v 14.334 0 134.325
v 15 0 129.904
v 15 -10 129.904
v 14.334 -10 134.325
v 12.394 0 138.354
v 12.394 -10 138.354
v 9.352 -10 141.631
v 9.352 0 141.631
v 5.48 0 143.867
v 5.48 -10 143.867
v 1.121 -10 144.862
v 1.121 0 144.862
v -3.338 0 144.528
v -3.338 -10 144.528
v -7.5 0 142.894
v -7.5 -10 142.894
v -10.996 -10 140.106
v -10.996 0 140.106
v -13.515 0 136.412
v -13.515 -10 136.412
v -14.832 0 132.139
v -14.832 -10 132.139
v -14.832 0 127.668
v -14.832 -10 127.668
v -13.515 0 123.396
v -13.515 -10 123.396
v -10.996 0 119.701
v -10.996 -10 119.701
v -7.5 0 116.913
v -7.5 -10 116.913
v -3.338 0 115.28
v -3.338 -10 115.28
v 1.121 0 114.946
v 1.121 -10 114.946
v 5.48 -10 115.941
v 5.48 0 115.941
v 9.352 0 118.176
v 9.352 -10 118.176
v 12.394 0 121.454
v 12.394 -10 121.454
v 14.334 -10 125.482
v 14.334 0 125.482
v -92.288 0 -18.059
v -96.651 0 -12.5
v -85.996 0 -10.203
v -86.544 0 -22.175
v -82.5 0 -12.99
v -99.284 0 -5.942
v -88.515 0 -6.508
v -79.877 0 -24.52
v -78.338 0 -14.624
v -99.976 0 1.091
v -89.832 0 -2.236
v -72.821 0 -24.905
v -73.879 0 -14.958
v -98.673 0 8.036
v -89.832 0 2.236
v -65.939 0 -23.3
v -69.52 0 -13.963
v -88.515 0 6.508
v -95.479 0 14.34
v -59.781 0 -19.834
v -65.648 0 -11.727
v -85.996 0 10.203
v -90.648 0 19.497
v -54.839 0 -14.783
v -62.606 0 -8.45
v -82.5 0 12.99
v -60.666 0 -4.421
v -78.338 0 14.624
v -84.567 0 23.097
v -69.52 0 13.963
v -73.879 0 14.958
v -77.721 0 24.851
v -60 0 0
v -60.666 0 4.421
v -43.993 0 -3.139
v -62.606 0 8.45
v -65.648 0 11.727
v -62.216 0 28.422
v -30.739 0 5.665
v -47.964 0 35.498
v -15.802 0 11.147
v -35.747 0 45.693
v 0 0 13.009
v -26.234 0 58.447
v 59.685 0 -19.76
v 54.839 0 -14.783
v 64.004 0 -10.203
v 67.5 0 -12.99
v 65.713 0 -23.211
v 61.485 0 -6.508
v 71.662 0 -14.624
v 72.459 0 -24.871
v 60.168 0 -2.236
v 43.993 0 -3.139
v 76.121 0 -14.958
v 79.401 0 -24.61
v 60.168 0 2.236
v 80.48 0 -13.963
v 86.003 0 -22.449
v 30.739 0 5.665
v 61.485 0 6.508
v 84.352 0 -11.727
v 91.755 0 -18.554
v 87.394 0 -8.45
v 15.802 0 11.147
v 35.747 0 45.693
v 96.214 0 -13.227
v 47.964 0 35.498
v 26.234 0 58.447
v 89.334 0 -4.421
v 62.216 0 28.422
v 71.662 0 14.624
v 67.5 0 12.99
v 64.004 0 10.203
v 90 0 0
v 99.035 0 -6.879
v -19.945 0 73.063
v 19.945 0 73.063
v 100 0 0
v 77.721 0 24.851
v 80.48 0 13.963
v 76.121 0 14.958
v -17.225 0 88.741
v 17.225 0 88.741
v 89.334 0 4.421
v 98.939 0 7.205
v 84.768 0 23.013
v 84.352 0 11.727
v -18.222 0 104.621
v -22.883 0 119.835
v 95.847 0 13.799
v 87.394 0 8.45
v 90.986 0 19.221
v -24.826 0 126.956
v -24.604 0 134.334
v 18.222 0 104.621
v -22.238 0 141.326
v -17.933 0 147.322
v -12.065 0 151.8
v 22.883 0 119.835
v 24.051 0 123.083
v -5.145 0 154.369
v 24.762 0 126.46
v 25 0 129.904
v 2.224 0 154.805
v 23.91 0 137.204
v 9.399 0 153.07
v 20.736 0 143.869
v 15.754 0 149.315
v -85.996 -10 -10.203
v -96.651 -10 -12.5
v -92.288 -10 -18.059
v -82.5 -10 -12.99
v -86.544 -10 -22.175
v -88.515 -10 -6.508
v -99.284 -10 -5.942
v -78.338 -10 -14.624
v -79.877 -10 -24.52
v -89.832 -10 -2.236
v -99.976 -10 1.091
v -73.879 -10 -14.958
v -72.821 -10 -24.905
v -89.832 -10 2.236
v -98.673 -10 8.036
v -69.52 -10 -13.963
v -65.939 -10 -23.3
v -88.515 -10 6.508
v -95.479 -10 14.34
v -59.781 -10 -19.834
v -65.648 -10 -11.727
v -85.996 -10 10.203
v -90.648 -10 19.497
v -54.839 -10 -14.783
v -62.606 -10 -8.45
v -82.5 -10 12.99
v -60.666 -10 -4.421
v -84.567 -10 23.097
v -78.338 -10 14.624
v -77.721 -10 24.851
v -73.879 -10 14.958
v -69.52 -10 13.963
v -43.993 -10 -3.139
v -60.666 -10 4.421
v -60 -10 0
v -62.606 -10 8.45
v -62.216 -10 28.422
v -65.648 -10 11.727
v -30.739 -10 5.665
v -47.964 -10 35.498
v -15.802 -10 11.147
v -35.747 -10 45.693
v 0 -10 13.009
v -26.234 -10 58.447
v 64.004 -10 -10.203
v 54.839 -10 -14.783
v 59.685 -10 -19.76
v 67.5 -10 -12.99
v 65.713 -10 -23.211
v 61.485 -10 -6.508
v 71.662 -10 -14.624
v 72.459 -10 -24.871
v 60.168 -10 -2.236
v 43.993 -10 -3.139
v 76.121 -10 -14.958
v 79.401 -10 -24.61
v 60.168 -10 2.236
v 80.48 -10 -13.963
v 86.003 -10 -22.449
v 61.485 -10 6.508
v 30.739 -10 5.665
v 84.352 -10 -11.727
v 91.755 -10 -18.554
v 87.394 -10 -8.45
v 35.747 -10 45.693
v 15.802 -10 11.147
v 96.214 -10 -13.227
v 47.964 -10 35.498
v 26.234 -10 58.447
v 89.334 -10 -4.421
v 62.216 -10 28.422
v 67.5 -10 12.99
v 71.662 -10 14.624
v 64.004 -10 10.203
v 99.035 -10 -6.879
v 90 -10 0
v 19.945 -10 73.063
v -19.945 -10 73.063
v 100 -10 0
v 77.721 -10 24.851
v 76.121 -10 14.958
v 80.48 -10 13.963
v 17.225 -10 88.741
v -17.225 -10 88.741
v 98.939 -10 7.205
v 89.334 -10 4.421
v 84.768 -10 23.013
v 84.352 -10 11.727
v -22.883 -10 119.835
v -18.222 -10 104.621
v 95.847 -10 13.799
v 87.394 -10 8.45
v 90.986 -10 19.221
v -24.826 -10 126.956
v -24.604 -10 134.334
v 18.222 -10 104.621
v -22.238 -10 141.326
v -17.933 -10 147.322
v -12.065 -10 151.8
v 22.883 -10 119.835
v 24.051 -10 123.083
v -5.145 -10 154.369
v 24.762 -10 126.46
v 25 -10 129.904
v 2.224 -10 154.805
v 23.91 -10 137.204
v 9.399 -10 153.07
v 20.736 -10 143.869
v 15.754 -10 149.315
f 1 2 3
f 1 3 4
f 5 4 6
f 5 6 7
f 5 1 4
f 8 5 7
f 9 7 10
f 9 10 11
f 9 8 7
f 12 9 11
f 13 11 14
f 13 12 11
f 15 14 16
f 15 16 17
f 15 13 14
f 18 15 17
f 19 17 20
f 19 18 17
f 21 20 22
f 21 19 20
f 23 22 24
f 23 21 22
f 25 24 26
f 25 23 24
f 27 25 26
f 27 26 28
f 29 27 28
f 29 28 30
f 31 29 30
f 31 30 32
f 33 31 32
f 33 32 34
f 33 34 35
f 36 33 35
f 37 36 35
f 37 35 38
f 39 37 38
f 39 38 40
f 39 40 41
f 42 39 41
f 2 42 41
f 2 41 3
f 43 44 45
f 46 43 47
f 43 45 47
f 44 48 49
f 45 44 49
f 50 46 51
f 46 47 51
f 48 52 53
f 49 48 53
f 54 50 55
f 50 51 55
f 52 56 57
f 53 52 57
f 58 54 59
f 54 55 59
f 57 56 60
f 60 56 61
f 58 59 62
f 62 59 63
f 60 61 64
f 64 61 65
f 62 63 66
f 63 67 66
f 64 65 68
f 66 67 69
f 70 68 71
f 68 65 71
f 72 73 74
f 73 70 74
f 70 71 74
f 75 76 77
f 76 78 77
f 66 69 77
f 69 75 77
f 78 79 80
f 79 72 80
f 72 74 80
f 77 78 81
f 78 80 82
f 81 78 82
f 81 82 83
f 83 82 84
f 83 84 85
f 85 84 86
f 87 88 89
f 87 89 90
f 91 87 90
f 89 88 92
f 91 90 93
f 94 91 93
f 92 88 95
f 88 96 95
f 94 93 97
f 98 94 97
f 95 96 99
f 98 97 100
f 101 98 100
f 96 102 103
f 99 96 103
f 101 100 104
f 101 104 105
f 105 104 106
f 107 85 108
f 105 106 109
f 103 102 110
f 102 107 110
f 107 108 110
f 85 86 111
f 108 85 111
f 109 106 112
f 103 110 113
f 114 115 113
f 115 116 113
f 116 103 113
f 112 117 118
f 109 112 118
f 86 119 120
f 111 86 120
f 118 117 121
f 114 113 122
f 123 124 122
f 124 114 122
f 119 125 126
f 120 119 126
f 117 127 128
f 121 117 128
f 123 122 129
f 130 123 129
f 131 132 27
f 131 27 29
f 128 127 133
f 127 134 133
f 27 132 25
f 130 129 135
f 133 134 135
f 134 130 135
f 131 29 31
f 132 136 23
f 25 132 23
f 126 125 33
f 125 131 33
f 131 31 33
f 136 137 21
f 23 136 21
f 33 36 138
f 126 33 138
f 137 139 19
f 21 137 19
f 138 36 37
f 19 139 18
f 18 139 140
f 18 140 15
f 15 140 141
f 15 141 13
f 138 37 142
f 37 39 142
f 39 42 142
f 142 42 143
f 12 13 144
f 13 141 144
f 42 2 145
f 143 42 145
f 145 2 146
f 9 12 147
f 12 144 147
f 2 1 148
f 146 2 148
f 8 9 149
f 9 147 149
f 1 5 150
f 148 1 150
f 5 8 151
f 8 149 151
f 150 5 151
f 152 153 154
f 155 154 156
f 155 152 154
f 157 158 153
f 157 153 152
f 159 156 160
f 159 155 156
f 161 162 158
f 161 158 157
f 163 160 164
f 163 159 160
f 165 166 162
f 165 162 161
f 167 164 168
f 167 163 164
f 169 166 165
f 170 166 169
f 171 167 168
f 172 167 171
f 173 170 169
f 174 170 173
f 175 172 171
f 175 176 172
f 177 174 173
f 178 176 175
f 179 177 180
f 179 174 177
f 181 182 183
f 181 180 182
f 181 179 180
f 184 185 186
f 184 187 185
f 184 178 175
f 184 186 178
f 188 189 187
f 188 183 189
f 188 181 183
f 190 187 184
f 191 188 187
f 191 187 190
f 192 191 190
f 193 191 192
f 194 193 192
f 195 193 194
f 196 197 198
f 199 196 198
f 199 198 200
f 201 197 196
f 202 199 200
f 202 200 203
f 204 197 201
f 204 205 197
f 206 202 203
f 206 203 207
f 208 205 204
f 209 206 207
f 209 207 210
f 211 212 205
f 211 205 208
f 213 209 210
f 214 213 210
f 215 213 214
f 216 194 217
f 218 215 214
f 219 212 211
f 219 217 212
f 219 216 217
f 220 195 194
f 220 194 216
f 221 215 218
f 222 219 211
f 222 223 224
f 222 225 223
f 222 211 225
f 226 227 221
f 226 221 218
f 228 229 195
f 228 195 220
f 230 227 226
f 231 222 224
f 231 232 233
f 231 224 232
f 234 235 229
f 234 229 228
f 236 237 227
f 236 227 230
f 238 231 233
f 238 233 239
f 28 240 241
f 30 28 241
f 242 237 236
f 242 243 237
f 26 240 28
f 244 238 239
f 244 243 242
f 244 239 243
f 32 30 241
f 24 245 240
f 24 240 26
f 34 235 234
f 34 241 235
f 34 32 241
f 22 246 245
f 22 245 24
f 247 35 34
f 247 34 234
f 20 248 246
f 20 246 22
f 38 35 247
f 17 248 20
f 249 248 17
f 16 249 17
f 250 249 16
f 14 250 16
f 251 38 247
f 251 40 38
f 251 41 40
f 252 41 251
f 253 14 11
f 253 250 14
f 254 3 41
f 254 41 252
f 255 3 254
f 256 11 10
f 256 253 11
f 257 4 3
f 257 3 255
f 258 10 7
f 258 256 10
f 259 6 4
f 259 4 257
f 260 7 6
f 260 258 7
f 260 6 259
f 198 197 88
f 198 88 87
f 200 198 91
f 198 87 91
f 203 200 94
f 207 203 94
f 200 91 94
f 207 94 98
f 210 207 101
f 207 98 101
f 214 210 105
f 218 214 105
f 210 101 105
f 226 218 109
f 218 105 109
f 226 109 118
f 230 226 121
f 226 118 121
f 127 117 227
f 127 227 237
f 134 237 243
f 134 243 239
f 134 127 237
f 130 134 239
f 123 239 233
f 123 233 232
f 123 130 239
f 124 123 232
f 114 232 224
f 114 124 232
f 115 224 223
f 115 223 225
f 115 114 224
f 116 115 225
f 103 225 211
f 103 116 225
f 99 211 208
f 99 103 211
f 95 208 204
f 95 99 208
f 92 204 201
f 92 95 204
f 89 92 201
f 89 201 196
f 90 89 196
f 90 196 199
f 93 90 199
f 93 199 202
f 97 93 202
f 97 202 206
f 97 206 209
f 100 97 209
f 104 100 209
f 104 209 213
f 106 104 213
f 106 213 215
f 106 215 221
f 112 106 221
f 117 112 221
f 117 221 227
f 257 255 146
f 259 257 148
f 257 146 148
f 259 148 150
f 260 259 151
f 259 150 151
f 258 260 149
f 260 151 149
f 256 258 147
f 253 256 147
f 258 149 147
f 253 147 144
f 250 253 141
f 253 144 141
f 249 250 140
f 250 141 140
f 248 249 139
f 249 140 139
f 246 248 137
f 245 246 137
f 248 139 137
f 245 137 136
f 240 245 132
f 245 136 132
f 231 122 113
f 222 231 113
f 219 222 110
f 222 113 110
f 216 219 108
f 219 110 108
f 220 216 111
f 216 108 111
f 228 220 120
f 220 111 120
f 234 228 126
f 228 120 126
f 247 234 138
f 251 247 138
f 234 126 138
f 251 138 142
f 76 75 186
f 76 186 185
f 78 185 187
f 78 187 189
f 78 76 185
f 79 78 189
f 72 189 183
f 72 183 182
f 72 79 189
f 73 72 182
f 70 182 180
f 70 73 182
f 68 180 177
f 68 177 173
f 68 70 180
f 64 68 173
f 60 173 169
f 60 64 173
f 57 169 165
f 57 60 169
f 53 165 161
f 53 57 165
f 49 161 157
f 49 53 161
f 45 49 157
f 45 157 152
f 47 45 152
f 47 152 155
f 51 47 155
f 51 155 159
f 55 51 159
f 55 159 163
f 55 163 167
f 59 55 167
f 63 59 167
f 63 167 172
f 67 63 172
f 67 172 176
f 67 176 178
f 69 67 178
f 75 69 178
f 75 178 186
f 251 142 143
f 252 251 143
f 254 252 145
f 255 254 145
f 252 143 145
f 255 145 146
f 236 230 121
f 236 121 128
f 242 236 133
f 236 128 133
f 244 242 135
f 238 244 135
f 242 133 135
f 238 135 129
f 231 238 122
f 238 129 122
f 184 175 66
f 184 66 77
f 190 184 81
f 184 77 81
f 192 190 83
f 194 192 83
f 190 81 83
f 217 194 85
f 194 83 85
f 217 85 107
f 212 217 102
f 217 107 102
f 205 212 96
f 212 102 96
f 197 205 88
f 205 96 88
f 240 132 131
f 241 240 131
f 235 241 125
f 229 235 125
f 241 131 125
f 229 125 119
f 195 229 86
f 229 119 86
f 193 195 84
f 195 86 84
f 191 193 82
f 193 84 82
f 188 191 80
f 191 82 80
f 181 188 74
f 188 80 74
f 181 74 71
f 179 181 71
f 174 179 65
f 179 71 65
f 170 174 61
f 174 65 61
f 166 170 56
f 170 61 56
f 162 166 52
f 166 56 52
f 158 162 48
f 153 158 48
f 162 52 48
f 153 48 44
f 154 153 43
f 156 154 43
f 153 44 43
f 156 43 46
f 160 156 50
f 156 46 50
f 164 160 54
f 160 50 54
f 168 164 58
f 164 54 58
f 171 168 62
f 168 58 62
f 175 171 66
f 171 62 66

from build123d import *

# Parameters (mm, degrees)
F0_R     = 15
F1_DEPTH = 5
F2_DEPTH = 10


with BuildPart() as f1:
    # F0 (on Front) → F1 (new body)
    with BuildSketch(Plane.XZ):
        with BuildLine():
            ThreePointArc((22.882668, 119.834872), (24.464941, 124.759235), (25, 129.903811))
            ThreePointArc((25, 129.903811), (-5.144575, 154.368752), (-22.882668, 119.834872))
            ThreePointArc((-22.882668, 119.834872), (0, 104.903811), (22.882668, 119.834872))
        make_face()
        with Locations((0, 129.903811)):
            Circle(F0_R, mode=Mode.SUBTRACT)
        with BuildLine():
            ThreePointArc((22.882668, 119.834872), (0, 104.903811), (-22.882668, 119.834872))
            ThreePointArc((-22.882668, 119.834872), (-26.233796, 58.447359), (-77.721377, 24.851441))
            ThreePointArc((-77.721377, 24.851441), (-58.312197, 18.614973), (-50, 0))
            ThreePointArc((-50, 0), (-51.240452, -7.777138), (-54.83871, -14.782502))
            ThreePointArc((-54.83871, -14.782502), (0, 13.009092), (54.83871, -14.782502))
            ThreePointArc((54.83871, -14.782502), (53.349365, 12.5), (77.721377, 24.851441))
            ThreePointArc((77.721377, 24.851441), (26.233796, 58.447359), (22.882668, 119.834872))
        make_face()
        with BuildLine():
            ThreePointArc((-50, 0), (-58.312197, 18.614973), (-77.721377, 24.851441))
            ThreePointArc((-77.721377, 24.851441), (-96.650635, -12.5), (-54.83871, -14.782502))
            ThreePointArc((-54.83871, -14.782502), (-51.240452, -7.777138), (-50, 0))
        make_face()
        with Locations((-75, 0)):
            Circle(F0_R, mode=Mode.SUBTRACT)
        with BuildLine():
            ThreePointArc((100, 0), (93.614973, 16.687803), (77.721377, 24.851441))
            ThreePointArc((77.721377, 24.851441), (53.349365, 12.5), (54.83871, -14.782502))
            ThreePointArc((54.83871, -14.782502), (82.777138, -23.759548), (100, 0))
        make_face()
        with Locations((75, 0)):
            Circle(F0_R, mode=Mode.SUBTRACT)
    extrude(amount=F1_DEPTH)

    # F0 (on Front) → F2 (join)
    with BuildSketch(Plane.XZ):
        with BuildLine():
            ThreePointArc((22.882668, 119.834872), (24.464941, 124.759235), (25, 129.903811))
            ThreePointArc((25, 129.903811), (-5.144575, 154.368752), (-22.882668, 119.834872))
            ThreePointArc((-22.882668, 119.834872), (0, 104.903811), (22.882668, 119.834872))
        make_face()
        with Locations((0, 129.903811)):
            Circle(F0_R, mode=Mode.SUBTRACT)
        with BuildLine():
            ThreePointArc((22.882668, 119.834872), (0, 104.903811), (-22.882668, 119.834872))
            ThreePointArc((-22.882668, 119.834872), (-26.233796, 58.447359), (-77.721377, 24.851441))
            ThreePointArc((-77.721377, 24.851441), (-58.312197, 18.614973), (-50, 0))
            ThreePointArc((-50, 0), (-51.240452, -7.777138), (-54.83871, -14.782502))
            ThreePointArc((-54.83871, -14.782502), (0, 13.009092), (54.83871, -14.782502))
            ThreePointArc((54.83871, -14.782502), (53.349365, 12.5), (77.721377, 24.851441))
            ThreePointArc((77.721377, 24.851441), (26.233796, 58.447359), (22.882668, 119.834872))
        make_face()
        with BuildLine():
            ThreePointArc((-50, 0), (-58.312197, 18.614973), (-77.721377, 24.851441))
            ThreePointArc((-77.721377, 24.851441), (-96.650635, -12.5), (-54.83871, -14.782502))
            ThreePointArc((-54.83871, -14.782502), (-51.240452, -7.777138), (-50, 0))
        make_face()
        with Locations((-75, 0)):
            Circle(F0_R, mode=Mode.SUBTRACT)
        with BuildLine():
            ThreePointArc((100, 0), (93.614973, 16.687803), (77.721377, 24.851441))
            ThreePointArc((77.721377, 24.851441), (53.349365, 12.5), (54.83871, -14.782502))
            ThreePointArc((54.83871, -14.782502), (82.777138, -23.759548), (100, 0))
        make_face()
        with Locations((75, 0)):
            Circle(F0_R, mode=Mode.SUBTRACT)
    extrude(amount=F2_DEPTH)


solid = f1.part
